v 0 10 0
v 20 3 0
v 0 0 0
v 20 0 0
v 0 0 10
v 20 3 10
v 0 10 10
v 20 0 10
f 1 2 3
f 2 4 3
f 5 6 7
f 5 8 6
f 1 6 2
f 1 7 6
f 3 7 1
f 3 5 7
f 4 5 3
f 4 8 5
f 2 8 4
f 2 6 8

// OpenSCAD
// Вставка (проставка) под крыло: клин от 10 до 3 мм
// Габариты по фото: длина 20, высота 10, глубина (экструзия) 10
// Параметризовано для быстрой подгонки
$fn = 64;

// Основной модуль клина
module shim_wedge(length_mm = 20, height_left_mm = 10, height_right_mm = 3, depth_mm = 10, center_z = false) {
    linear_extrude(height = depth_mm, center = center_z)
        polygon(points = [
            [0, 0],                         // нижний левый
            [length_mm, 0],                 // нижний правый
            [length_mm, height_right_mm],   // верхний правый (тонкая сторона)
            [0, height_left_mm]             // верхний левый (толстая сторона)
        ],
        paths = [[0,1,2,3]]);
}

// Вызов для размеров из задания:
shim_wedge(length_mm = 20, height_left_mm = 10, height_right_mm = 3, depth_mm = 10, center_z = false);
